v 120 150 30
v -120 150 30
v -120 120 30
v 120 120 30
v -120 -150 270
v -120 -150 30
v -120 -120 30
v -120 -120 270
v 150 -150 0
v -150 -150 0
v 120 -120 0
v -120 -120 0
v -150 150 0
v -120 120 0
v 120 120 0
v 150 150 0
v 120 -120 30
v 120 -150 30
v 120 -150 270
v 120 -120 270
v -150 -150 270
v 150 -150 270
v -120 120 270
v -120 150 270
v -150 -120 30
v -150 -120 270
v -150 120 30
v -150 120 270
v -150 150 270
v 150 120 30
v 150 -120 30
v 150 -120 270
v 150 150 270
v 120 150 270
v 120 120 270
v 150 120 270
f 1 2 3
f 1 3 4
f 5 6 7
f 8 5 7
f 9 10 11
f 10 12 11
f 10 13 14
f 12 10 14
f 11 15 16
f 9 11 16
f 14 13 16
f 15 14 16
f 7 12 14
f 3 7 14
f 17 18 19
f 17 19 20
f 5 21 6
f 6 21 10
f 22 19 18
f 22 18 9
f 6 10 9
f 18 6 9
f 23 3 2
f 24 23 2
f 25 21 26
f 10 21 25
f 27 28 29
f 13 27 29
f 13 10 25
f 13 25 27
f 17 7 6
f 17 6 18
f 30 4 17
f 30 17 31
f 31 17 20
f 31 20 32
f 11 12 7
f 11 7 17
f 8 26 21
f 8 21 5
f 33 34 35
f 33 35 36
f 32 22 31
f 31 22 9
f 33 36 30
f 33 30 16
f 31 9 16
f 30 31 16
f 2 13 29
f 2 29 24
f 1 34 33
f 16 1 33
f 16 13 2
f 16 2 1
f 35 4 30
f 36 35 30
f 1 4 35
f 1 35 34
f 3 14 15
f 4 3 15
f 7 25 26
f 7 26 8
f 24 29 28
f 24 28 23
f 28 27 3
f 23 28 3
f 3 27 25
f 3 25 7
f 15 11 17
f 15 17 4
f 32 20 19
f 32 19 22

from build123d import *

# Parameters (mm, degrees)
F0_W     = 300
F0_H     = 300
F0_W_2   = 240
F0_H_2   = 240
F1_DEPTH = 30
F2_W     = 30
F2_H     = 30
F3_DEPTH = 240


with BuildPart() as f1:
    # F0 (on Top) → F1 (new body)
    with BuildSketch(Plane.XY):
        Rectangle(F0_W, F0_H)
        Rectangle(F0_W_2, F0_H_2, mode=Mode.SUBTRACT)
    extrude(amount=F1_DEPTH)

    # F2 (on face) → F3 (join)
    with BuildSketch(Plane.XY.offset(30)):
        with Locations((-135, 135)):
            Rectangle(F2_W, F2_H)
        with Locations((135, 135)):
            Rectangle(F2_W, F2_H)
        with Locations((135, -135)):
            Rectangle(F2_W, F2_H)
        with Locations((-135, -135)):
            Rectangle(F2_W, F2_H)
    extrude(amount=F3_DEPTH)


solid = f1.part
